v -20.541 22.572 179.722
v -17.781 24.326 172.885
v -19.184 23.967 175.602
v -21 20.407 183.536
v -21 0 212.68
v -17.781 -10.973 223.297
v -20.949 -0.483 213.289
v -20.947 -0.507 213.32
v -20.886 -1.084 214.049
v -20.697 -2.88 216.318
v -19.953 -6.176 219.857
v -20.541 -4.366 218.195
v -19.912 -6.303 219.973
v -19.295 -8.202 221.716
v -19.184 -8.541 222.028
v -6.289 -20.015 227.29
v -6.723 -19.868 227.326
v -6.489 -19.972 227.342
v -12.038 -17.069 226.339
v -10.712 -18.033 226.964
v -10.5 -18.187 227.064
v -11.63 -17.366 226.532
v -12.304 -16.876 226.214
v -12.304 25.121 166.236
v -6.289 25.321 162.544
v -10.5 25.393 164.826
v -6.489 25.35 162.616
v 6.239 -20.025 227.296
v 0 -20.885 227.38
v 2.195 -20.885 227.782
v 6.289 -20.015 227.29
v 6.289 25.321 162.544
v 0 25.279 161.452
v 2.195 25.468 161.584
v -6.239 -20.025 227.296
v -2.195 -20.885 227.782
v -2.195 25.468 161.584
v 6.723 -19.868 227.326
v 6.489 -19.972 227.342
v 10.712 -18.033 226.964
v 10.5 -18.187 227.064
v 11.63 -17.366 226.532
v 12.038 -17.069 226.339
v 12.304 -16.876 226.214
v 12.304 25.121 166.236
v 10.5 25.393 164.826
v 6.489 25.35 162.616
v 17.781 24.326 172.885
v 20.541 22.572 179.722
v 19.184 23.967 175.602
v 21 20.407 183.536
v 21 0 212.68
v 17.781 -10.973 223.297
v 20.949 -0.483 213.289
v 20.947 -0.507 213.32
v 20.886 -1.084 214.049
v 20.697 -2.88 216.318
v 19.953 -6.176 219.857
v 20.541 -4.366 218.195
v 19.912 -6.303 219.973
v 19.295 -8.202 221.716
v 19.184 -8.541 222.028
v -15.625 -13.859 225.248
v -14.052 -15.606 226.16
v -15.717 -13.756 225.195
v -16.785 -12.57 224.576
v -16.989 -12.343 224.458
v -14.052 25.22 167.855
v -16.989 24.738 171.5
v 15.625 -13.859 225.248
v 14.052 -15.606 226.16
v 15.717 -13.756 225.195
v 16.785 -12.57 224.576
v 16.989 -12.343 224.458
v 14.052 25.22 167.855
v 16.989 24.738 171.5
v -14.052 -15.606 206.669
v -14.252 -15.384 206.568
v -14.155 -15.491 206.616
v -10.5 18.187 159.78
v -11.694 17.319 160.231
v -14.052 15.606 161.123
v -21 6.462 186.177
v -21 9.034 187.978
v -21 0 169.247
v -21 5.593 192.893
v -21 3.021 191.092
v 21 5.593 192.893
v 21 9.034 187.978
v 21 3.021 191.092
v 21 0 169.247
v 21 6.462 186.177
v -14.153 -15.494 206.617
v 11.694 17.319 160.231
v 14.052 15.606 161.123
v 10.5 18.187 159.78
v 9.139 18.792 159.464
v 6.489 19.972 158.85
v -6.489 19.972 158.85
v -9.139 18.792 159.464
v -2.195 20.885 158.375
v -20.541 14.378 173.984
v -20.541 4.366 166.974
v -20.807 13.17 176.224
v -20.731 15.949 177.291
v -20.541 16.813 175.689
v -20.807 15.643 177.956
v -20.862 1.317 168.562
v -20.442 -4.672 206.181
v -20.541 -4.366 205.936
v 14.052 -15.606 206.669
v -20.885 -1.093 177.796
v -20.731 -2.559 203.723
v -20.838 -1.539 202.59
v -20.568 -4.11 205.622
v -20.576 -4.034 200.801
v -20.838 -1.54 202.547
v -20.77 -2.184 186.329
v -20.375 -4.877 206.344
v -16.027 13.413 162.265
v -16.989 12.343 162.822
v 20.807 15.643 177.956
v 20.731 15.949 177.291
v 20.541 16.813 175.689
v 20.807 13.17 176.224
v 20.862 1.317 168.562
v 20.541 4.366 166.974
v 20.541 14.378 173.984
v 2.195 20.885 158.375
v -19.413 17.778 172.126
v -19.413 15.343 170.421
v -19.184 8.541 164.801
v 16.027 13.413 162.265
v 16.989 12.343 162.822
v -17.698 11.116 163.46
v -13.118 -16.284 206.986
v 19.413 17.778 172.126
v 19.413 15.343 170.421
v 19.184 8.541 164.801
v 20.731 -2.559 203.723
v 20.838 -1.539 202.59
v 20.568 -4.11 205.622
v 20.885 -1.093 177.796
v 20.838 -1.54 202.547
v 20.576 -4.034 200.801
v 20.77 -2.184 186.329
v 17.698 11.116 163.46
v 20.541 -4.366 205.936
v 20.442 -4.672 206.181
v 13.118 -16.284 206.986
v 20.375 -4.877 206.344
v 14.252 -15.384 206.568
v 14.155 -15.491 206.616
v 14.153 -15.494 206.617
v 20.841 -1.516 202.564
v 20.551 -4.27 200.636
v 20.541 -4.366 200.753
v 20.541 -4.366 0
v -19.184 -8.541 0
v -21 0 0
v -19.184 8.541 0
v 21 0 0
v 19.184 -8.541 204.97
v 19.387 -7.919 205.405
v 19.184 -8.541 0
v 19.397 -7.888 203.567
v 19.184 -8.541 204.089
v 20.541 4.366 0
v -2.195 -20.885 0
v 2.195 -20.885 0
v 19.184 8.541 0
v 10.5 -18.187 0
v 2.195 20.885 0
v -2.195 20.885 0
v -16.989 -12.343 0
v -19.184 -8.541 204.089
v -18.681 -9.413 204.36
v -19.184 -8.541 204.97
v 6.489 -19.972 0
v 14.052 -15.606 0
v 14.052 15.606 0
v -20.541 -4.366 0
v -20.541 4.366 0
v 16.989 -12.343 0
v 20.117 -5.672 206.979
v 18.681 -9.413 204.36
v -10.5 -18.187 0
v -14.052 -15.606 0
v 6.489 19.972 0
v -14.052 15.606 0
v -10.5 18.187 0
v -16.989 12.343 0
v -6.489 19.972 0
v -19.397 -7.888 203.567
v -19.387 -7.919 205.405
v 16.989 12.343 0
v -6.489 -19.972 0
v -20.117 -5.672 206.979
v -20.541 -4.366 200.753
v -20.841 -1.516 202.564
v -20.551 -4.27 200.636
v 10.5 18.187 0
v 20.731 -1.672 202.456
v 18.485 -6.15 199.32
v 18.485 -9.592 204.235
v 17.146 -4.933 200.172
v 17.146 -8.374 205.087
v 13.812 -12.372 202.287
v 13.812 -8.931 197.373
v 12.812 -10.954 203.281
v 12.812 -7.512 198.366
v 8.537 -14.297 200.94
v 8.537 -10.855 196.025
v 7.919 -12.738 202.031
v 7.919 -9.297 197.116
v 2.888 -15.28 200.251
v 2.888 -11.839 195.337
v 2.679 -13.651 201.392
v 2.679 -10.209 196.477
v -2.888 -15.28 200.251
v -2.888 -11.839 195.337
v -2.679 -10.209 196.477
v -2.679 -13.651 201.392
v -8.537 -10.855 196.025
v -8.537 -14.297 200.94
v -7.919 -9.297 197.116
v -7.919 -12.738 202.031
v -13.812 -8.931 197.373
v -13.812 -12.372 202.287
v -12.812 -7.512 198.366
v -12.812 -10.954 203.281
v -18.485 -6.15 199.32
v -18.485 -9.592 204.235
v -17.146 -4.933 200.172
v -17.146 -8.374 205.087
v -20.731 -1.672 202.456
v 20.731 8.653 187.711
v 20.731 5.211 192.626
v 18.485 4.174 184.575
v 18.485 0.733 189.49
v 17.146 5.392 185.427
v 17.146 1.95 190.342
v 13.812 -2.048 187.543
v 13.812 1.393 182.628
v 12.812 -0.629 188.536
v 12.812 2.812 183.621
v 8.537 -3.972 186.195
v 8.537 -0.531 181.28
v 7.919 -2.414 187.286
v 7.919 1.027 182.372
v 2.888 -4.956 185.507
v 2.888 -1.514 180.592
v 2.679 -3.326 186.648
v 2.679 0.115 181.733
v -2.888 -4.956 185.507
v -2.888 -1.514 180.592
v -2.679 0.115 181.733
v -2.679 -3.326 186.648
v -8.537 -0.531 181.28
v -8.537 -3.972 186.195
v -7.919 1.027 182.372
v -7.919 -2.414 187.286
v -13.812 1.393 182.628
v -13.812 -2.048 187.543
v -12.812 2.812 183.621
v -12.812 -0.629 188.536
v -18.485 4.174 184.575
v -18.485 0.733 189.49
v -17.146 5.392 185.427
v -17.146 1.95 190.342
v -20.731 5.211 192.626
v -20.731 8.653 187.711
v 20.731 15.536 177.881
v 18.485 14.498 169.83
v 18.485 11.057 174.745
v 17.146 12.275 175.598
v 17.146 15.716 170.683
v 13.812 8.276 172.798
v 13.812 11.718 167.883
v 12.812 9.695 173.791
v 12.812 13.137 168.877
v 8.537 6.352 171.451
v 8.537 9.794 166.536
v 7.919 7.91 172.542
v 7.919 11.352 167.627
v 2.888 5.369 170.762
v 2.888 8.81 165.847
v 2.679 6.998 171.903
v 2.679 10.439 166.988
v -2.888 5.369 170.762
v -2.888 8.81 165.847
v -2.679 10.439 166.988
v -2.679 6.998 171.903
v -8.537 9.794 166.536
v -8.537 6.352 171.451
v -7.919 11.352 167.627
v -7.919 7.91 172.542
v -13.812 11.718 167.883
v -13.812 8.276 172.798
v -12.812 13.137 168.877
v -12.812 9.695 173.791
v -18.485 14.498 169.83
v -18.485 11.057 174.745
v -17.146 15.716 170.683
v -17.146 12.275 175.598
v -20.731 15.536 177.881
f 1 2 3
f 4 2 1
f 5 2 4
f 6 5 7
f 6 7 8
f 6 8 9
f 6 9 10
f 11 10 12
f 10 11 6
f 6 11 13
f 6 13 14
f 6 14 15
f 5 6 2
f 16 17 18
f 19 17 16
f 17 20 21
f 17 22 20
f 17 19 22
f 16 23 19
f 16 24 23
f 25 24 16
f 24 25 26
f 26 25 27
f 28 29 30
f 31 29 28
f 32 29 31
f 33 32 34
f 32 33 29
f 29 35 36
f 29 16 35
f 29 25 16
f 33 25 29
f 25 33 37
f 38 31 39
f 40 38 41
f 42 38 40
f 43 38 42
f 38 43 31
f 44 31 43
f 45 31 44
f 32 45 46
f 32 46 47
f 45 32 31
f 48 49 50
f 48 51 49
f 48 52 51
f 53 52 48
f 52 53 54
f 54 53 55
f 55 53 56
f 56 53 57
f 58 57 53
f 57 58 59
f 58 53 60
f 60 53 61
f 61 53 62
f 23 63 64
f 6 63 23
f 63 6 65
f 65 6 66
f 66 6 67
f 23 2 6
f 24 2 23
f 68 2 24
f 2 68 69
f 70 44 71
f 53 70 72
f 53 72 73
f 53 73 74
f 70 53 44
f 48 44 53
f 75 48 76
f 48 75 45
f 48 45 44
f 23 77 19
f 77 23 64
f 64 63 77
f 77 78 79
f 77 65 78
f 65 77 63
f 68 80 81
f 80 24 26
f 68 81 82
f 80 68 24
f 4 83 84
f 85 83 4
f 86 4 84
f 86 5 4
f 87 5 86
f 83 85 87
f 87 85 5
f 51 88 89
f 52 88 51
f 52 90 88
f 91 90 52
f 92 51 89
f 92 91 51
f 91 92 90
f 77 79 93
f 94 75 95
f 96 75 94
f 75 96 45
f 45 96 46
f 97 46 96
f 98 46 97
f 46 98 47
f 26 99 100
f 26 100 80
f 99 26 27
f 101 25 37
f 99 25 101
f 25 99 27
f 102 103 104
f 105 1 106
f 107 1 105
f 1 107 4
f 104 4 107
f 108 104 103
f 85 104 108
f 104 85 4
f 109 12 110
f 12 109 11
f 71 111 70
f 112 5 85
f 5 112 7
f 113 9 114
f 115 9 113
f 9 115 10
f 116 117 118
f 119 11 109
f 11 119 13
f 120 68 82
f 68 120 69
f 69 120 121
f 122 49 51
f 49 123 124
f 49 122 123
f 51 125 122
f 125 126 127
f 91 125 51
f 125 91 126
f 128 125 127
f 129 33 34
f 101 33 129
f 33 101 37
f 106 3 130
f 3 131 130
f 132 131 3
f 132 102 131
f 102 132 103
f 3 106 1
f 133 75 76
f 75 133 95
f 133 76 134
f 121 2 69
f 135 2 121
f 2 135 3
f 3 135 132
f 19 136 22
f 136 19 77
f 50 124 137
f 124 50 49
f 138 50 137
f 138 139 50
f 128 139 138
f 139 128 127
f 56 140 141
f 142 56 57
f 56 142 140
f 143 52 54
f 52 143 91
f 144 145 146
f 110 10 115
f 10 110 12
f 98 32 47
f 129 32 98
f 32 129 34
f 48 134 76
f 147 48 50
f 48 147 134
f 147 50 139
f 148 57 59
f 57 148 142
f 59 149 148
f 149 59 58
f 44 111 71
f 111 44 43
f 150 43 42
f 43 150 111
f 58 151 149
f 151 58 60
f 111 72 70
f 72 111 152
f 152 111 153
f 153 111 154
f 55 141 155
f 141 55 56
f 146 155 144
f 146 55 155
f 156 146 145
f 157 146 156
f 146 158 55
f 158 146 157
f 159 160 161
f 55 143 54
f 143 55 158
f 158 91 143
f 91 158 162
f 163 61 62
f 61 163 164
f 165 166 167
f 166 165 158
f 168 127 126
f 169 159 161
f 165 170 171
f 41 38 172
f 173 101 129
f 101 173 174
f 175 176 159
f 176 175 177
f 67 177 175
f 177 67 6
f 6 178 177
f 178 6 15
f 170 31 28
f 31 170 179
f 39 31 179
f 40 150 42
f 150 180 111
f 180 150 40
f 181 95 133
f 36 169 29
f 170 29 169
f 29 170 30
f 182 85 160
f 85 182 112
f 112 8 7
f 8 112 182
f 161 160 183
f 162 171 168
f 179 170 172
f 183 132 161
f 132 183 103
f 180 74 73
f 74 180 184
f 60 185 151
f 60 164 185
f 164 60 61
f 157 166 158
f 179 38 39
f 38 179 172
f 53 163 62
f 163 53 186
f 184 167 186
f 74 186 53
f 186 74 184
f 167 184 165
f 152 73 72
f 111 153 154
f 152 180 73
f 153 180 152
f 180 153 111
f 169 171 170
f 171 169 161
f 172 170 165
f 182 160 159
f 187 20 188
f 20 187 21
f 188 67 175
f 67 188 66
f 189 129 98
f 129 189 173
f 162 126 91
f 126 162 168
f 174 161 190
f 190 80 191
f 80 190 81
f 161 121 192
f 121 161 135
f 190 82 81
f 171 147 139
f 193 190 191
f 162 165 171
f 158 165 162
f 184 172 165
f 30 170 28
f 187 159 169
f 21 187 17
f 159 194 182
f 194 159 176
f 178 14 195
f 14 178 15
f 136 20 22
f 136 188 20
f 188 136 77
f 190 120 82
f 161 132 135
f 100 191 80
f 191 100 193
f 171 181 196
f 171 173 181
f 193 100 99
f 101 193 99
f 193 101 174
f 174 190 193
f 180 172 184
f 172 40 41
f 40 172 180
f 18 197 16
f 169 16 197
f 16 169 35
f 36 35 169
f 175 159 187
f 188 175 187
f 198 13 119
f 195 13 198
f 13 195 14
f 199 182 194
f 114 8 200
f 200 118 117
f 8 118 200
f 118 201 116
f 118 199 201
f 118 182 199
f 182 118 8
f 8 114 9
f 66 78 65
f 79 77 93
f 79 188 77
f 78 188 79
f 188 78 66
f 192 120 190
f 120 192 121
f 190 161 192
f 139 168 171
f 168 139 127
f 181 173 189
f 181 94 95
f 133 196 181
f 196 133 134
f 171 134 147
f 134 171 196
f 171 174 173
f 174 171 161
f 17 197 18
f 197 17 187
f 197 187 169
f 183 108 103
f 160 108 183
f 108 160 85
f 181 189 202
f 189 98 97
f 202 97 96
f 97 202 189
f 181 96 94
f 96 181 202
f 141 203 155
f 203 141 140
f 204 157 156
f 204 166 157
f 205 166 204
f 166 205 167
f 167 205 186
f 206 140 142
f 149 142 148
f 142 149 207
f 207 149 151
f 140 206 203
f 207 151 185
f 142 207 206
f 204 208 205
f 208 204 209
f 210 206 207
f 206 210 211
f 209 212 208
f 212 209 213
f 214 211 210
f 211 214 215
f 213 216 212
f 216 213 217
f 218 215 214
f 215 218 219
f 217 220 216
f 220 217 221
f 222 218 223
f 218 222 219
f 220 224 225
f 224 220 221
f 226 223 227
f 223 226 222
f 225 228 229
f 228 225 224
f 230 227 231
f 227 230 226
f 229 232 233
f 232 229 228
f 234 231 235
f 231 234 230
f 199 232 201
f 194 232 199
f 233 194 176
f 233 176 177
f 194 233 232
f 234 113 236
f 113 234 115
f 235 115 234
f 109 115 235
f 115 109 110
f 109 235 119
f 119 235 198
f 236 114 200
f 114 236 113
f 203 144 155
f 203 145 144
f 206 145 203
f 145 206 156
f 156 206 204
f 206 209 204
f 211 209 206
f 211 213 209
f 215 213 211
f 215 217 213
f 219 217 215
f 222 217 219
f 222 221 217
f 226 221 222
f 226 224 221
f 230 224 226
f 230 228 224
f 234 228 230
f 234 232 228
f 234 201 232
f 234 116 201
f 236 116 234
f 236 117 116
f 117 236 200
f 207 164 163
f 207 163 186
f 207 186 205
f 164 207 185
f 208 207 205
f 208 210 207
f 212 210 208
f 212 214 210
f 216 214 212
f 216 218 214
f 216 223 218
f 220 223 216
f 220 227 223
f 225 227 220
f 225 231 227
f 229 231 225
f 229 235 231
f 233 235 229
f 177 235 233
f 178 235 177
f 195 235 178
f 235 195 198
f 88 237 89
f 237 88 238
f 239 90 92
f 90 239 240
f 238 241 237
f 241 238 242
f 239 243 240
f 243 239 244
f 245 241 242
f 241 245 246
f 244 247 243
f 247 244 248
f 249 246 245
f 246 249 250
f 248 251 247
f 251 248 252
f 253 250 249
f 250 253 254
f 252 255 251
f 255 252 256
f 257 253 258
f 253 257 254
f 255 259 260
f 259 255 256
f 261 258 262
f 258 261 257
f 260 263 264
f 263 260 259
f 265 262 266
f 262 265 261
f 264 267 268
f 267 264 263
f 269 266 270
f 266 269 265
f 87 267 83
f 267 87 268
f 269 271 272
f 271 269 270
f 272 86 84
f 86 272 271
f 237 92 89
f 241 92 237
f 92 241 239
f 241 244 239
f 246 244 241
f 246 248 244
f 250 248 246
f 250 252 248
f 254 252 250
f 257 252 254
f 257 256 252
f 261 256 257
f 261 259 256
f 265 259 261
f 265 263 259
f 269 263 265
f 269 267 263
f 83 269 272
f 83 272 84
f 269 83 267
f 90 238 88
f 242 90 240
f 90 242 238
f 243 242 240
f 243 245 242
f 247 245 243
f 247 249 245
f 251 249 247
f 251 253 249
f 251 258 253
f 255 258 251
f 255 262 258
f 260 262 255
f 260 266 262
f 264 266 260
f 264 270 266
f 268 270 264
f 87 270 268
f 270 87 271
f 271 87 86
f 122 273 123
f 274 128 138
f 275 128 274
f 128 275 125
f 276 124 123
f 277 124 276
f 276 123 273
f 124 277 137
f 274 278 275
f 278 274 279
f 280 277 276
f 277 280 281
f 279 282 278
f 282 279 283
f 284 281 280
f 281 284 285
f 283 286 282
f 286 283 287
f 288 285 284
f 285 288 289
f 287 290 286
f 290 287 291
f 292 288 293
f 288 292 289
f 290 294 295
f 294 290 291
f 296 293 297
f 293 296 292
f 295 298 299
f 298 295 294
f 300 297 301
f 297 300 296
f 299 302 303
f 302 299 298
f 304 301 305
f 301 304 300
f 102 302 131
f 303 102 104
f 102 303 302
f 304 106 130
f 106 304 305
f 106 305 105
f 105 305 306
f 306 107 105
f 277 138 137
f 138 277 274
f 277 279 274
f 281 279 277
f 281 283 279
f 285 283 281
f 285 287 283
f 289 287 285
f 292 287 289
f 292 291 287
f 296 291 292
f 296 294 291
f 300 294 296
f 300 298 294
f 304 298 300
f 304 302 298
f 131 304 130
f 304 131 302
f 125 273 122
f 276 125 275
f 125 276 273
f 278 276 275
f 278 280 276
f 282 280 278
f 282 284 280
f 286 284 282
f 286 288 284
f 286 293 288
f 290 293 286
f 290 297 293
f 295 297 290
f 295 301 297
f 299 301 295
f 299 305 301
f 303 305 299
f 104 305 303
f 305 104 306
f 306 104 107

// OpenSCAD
// file: common.scad
// overridable global functions/variables
function mud_screw_off()=0;

module translate_bike() {
  children();
}
module norm_infill () {}
module high_infill () {}

////////////////////////////////////////////////////////////////////////

alpha=0.2;

// tires
tire_d_out=487;
tire_h=40;

// mud guard
mud_d = 60;
mud_straight = 35;
mud_axle_r = 290;
mud_axle_x = 195;
mud_axle_z = 150;

// mud strut
mud_strut_thick=5;
mud_strut_corner_r=5;
mud_strut_corner_dist=25;
mud_strut_hole_d=5;
mud_strut_hole_dist=15;
mud_strut_screw_d=9;
mud_strut_screw_len=10;
mud_strut_h_max=28;
mud_strut_corner_angle=45;
mud_strut_rotation=5;

// scaffold
beam_angle=8; // vs. horiz.
// Tread beam
beam_tread_d=60.5;
beam_tread_h=800;
// Tread extension beam
beam_tread_ext_d=53;
beam_tread_ext_h=310; // (customizable)
// Front derailleur beam
beam_derailleur_d=29;
beam_derailleur_h=180;
beam_derailleur_angle=65; // vs. tread beam
// Crankset axle
crankset_d=44;
crankset_h=70;
// Beams to wheels
beam_wheels_d=55;
beam_wheels_h=320; // FIXME: rough estimate
beam_wheels_angle_z=70; // sideways vs. tread beam
beam_wheels_angle_x=8; // up vs. tread beam FIXME: rough estimate
beam_wheels_offset_x=315; // from front of tread beam
beam_wheels_offset_z=15; // below tread beam FIXME: rough estimate

// Origin is back of main beam
module beams () {
  color("darkblue", alpha=alpha) rotate([0, 90-beam_angle, 0]){
    // Main beam
    translate([ 0, 0, beam_tread_h/2]) cylinder(d=beam_tread_d, h=beam_tread_h, center=true);
    // Extension beam
    translate([ 0, 0, beam_tread_h+beam_tread_ext_h/2,]) cylinder(d=beam_tread_ext_d, h=beam_tread_ext_h, center=true);
    // Crankset axle
    translate([ 0, 0, beam_tread_h+beam_tread_ext_h,]) rotate([90, 0, 0]) cylinder(d=crankset_d, h=crankset_h, center=true);
    // Derailleur beam
    translate([ 0, 0, beam_tread_h+beam_tread_ext_h,]) rotate([0, 180+beam_derailleur_angle, 0]) cylinder(d=beam_derailleur_d, h=beam_derailleur_h);
    // Wheel beam right
    translate([ beam_wheels_offset_z, 0, beam_tread_h-beam_wheels_offset_x,]) rotate([beam_wheels_angle_z, -beam_wheels_angle_x, 0]) cylinder(d=beam_wheels_d, h=beam_wheels_h);
    // Wheel beam left
    translate([ beam_wheels_offset_z, 0, beam_tread_h-beam_wheels_offset_x,]) rotate([-beam_wheels_angle_z, -beam_wheels_angle_x, 0]) cylinder(d=beam_wheels_d, h=beam_wheels_h);
    
  }
}

module mud_strut () {
  rotate([90,0,180])
  difference() {
    translate([0,0,-1]) // Make the strut intersect with the wing to prevent errors where the wing bends already
    minkowski() {
      linear_extrude(height = 4) polygon([
        [-70,                             1],
        [3,                               4],
        [3+mud_strut_corner_dist/sqrt(2), 4-mud_strut_corner_dist/sqrt(2)],
        [-70,                             4-mud_strut_corner_dist/sqrt(2)],
      ]);
      cylinder(r=5, h=2);
    }

    cylinder(h=mud_strut_thick, d=mud_strut_hole_d);
    translate([mud_strut_hole_dist/sqrt(2), -mud_strut_hole_dist/sqrt(2),0])
      cylinder(h=mud_strut_thick, d=mud_strut_hole_d);
  }
}

module mud_screws (off=0) {
  // Screw heads
  translate([0,mud_strut_thick+off,0])
    union() {
      rotate([90,0,180])
        cylinder(h=2, d=mud_strut_screw_d);
      translate([-mud_strut_hole_dist/sqrt(2), 0, -mud_strut_hole_dist/sqrt(2)])
        rotate([90,0,180])
          cylinder(h=2, d=mud_strut_screw_d);
    }

  // Screw shafts
  translate([0,-mud_strut_thick,0])
    union() {
        rotate([90,0,180])
      cylinder(h=mud_strut_screw_len+off, d=mud_strut_hole_d);
      translate([-mud_strut_hole_dist/sqrt(2), 0, -mud_strut_hole_dist/sqrt(2)])
        rotate([90,0,180])
          cylinder(h=mud_strut_screw_len+off, d=mud_strut_hole_d);
    }
}

module mud_guard_wing () {
  translate([mud_axle_x,0,-mud_axle_z])
  rotate([90,10,180])
      rotate_extrude(angle = 160, convexity = 10) 
        translate([mud_axle_r-mud_d/2, -mud_d/2, 0])
        union() {
          circle(d=mud_d);
          translate([-mud_straight,-mud_d/2,0])
            square([mud_straight,mud_d]);
        }
}

module tire () {
  translate([mud_axle_x, -tire_h/2-mud_d/2,-mud_axle_z])
    rotate([90,0,180])
      cylinder(h=tire_h, d=tire_d_out);
}
  
module wheel () {
  mud_guard();
  color("black", alpha=alpha) tire();
}

module mud_guard () {
  rotate([0,mud_strut_rotation,0]) {
    color("dimgrey", alpha=alpha) mud_strut();
    color("silver", alpha=alpha) mud_screws(off=mud_screw_off());
  }
  color("grey", alpha=alpha) mud_guard_wing();
}


// FIXME: all below are estimates
seat_off_x = -200;

seat_bot_x = 200;
seat_bot_y = 400;
seat_bot_z = 40;

seat_mid_x = 350;
seat_mid_y = seat_bot_y;
seat_mid_z = 40;

seat_top_x = 250;
seat_top_y = seat_bot_y;
seat_top_z = 40;

module seat () {
  color("grey", alpha=alpha) {
    rotate([0,5,0]) {
      translate([seat_off_x,bike_center_x()-seat_bot_y/2,0]) {
        cube([seat_bot_x, seat_bot_y, seat_bot_z]);

        rotate([0,45,0]) {
          translate([-seat_mid_x,0,0]) {
            cube([seat_mid_x, seat_mid_y, seat_mid_z]);

            rotate([0,15,0]) {
              translate([-seat_top_x,0,0]) {
                cube([seat_top_x, seat_top_y, seat_top_z]);
              }
            }
          }
        }
      }
    }
  }
}
  
function bike_center_x() = beam_wheels_h;

// Origin is top hole of back part of the right mud guard
module bike () {
  translate_bike() {
    // Right wheel
    wheel();
    translate([0,2*bike_center_x(),0]) // Left wheel
      mirror([0,1,0])
        wheel();

    translate([ // Beams
      -2*mud_axle_x
      ,
      bike_center_x() // FIXME
        // +sin(beam_wheels_angle_z)/beam_wheels_h
      ,
      // beam_tread_d/2,
      -mud_axle_z
    ])
      beams();

    seat();
  }
}



module draw () {
  if (!is_undef(is_left) && is_left != 0) {
    mirror([1,0,0])
    children();
  } else {
    children();
  }
}

module model () {
  %bike();

  if (!is_undef(is_high_infill) && is_high_infill != 0) {
    high_infill();
  } else {
    norm_infill();
  }
}

draw() model();
// main file
// $fn=50;
// $fn=200;

// is_high_infill = 1;

include <common.scad>;
module translate_bike() {
  // translate([0, 0, submersed(branch_angle)+branch_l])
  rotate([-beam_angle-branch_angle, 180, 0])
  rotate([90, 270, 0])
  translate([-400, -bike_center_x(), -106])
  children();
}

wall_width=0; // <=0 == solid

branch_d=42; // HP Scorpion handlebar
branch_angle=35;
branch_l=200; // Length of fully non-"submersed" cylinder (some of that remains unusable due to the strut)

tie_w=6;
tie_h=2;
tie_wall_width=4;


// Based on https://github.com/Sembiance/common/blob/master/openscad/hollowCylinder.scad
module hollowCylinder(d=5, h=10, wall_width=1) {
  difference() {
    cylinder(d=d, h=h);
    translate([0, 0, -wall_width]) { cylinder(d=d-(wall_width*2), h=h-wall_width); }
  }
}


module tie_channel (h=3, w=6, off_h=0) {
  // off_v=h;
  rotate([90,0,0])
  translate([0, 0, off_h])
  translate([0, 0, tie_wall_width/tan(branch_angle)]) // Move horizontally to center of branch (by the distance going tie_wall_width up a slope of branch_angle)
  translate([0, tie_wall_width + (abs(beam_tread_d/2-branch_d/2))/2, 0]) // Move vertically tie_wall_width above intersection
  translate([0, 0, (beam_tread_d/2)/tan(branch_angle)]) // Move horizontally to center of intersection
  translate([0, 0, -w/2]) // Center on origin_y
  rotate_extrude(angle = 180, convexity = 2) 
  translate([(branch_d/2+beam_tread_d/2)/2, 0, 0]) // Move to "orbit" between the two radii
  square([h, w]);
}

module tie_channels (h=3, w=6, gap_percent=200) {
  actual_width = branch_d/sin(branch_angle);
  usable_width = actual_width - 2*h/tan(branch_angle) - 2*w; // Leaving w space left and right + accounting for slope
  chan_width = w+w*gap_percent/100;
  fitting_ties = 1+floor((usable_width-w)/chan_width);
  used_width = w + (fitting_ties-1) * chan_width;
  assert(usable_width-used_width >= 0);

  if (fitting_ties > 1) {
    min_h = -used_width/2;
    max_h = +used_width/2;
    for (o=[min_h:chan_width:max_h]) {
      tie_channel(h=tie_h, w=tie_w, off_h=o);
    }
  } else {
      tie_channel(h=tie_h, w=tie_w, off_h=0);
  }
}

module branch_top (ang=branch_angle) {
  if (is_undef(is_high_infill) || is_high_infill == 0) {
    if (wall_width > 0) {
      rotate([90-ang,0,0]) hollowCylinder(d=branch_d, h=submersed(ang)+branch_l, wall_width=wall_width);
    } else {
      rotate([90-ang,0,0]) cylinder(d=branch_d, h=submersed(ang)+branch_l);
    }
  }
}

// Returns the height (z axis) of the branch b 
function submersed(ang=branch_angle) = beam_tread_d/4/sin(ang)+branch_d/4/tan(ang);

module branch_base (ang=branch_angle) {
    // Make part with tie channels completely solid in any case.
    // To that end, cover the ties with a bigger copy of the beam cylinder (adding tie_wall_width on top of the channels)
    intersection() {
      rotate([90-ang,0,0]) cylinder(d=branch_d, h=submersed(ang)+branch_l);

      rotate([0, 90, 0])
        cylinder(center=true,
          h=beam_tread_h,
          d=0
          +2*(branch_d/2+beam_tread_d/2)/2
          +2*tie_h
          +3*tie_wall_width
          +(abs(beam_tread_d/2-branch_d/2))
        );
    }
}

module branch_strut() {
  branch_off = tan(90-branch_angle) * submersed();
  strut_off = branch_off;
  strut_h = submersed();
  translate([0, -strut_off, 0])
    cylinder(d=branch_d, h=strut_h);
}


module norm_infill () {
  difference () {
    translate([0,0,submersed(branch_angle)+branch_l]) {
      rotate([90+branch_angle,0,0]) {
        difference() {
            union() {
              hull() {
                branch_base();
                branch_strut();
              }
              branch_top();
            }

            tie_channels(h=tie_h, w=tie_w);
        }
      }
    }
    bike();
  }
}

module high_infill () {
  norm_infill();
}
